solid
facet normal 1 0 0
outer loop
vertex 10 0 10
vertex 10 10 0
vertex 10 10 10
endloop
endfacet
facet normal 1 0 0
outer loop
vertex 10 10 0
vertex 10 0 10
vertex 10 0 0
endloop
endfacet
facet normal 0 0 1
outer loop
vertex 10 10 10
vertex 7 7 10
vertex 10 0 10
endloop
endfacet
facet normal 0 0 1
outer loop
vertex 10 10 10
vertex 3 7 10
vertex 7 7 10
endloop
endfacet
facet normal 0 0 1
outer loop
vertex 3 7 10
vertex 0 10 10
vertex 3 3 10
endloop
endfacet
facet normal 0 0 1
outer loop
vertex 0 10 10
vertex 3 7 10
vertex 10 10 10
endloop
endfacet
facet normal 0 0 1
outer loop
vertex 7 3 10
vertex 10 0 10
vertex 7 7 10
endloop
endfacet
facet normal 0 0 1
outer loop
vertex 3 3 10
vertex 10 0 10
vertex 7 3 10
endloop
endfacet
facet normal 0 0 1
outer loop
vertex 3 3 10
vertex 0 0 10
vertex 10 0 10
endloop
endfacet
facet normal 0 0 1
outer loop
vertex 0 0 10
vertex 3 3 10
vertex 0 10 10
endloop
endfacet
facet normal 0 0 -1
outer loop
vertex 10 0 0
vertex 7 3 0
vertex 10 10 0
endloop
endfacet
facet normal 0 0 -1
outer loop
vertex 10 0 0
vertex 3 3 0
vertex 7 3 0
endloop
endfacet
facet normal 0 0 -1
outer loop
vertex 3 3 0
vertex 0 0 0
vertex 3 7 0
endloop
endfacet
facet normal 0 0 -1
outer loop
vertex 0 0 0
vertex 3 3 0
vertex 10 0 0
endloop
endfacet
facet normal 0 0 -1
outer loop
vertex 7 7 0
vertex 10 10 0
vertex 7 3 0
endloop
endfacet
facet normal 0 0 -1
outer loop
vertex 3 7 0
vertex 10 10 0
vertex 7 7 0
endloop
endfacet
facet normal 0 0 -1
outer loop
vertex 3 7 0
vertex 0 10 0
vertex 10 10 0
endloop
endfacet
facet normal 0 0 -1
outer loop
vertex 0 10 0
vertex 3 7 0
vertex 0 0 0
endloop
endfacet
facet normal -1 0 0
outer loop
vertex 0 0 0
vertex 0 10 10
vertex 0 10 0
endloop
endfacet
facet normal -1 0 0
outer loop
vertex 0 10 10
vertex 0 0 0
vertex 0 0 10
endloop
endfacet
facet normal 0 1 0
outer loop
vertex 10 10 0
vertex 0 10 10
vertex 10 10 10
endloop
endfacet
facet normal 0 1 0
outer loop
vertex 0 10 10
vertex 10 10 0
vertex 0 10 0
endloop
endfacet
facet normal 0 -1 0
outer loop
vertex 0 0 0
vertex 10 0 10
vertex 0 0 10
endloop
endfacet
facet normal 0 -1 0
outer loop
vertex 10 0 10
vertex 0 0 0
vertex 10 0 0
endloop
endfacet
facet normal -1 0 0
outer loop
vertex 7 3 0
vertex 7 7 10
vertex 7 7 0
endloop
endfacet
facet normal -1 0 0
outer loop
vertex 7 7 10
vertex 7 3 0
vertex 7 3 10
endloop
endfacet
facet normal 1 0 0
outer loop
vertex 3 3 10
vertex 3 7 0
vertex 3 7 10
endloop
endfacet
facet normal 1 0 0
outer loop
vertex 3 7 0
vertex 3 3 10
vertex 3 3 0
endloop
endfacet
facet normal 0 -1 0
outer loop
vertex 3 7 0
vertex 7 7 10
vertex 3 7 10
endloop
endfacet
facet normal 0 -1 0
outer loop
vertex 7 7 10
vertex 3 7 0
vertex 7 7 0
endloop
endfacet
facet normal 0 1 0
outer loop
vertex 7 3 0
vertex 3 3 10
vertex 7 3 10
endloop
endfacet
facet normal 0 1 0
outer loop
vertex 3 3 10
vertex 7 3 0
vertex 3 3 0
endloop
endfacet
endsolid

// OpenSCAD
// Corpus model: a cube with a square through-hole (a box subtracted, poking
// through in z) — the "hole" case, axis-aligned.
difference() {
    cube(10);
    translate([3, 3, -1]) cube([4, 4, 12]);
}
